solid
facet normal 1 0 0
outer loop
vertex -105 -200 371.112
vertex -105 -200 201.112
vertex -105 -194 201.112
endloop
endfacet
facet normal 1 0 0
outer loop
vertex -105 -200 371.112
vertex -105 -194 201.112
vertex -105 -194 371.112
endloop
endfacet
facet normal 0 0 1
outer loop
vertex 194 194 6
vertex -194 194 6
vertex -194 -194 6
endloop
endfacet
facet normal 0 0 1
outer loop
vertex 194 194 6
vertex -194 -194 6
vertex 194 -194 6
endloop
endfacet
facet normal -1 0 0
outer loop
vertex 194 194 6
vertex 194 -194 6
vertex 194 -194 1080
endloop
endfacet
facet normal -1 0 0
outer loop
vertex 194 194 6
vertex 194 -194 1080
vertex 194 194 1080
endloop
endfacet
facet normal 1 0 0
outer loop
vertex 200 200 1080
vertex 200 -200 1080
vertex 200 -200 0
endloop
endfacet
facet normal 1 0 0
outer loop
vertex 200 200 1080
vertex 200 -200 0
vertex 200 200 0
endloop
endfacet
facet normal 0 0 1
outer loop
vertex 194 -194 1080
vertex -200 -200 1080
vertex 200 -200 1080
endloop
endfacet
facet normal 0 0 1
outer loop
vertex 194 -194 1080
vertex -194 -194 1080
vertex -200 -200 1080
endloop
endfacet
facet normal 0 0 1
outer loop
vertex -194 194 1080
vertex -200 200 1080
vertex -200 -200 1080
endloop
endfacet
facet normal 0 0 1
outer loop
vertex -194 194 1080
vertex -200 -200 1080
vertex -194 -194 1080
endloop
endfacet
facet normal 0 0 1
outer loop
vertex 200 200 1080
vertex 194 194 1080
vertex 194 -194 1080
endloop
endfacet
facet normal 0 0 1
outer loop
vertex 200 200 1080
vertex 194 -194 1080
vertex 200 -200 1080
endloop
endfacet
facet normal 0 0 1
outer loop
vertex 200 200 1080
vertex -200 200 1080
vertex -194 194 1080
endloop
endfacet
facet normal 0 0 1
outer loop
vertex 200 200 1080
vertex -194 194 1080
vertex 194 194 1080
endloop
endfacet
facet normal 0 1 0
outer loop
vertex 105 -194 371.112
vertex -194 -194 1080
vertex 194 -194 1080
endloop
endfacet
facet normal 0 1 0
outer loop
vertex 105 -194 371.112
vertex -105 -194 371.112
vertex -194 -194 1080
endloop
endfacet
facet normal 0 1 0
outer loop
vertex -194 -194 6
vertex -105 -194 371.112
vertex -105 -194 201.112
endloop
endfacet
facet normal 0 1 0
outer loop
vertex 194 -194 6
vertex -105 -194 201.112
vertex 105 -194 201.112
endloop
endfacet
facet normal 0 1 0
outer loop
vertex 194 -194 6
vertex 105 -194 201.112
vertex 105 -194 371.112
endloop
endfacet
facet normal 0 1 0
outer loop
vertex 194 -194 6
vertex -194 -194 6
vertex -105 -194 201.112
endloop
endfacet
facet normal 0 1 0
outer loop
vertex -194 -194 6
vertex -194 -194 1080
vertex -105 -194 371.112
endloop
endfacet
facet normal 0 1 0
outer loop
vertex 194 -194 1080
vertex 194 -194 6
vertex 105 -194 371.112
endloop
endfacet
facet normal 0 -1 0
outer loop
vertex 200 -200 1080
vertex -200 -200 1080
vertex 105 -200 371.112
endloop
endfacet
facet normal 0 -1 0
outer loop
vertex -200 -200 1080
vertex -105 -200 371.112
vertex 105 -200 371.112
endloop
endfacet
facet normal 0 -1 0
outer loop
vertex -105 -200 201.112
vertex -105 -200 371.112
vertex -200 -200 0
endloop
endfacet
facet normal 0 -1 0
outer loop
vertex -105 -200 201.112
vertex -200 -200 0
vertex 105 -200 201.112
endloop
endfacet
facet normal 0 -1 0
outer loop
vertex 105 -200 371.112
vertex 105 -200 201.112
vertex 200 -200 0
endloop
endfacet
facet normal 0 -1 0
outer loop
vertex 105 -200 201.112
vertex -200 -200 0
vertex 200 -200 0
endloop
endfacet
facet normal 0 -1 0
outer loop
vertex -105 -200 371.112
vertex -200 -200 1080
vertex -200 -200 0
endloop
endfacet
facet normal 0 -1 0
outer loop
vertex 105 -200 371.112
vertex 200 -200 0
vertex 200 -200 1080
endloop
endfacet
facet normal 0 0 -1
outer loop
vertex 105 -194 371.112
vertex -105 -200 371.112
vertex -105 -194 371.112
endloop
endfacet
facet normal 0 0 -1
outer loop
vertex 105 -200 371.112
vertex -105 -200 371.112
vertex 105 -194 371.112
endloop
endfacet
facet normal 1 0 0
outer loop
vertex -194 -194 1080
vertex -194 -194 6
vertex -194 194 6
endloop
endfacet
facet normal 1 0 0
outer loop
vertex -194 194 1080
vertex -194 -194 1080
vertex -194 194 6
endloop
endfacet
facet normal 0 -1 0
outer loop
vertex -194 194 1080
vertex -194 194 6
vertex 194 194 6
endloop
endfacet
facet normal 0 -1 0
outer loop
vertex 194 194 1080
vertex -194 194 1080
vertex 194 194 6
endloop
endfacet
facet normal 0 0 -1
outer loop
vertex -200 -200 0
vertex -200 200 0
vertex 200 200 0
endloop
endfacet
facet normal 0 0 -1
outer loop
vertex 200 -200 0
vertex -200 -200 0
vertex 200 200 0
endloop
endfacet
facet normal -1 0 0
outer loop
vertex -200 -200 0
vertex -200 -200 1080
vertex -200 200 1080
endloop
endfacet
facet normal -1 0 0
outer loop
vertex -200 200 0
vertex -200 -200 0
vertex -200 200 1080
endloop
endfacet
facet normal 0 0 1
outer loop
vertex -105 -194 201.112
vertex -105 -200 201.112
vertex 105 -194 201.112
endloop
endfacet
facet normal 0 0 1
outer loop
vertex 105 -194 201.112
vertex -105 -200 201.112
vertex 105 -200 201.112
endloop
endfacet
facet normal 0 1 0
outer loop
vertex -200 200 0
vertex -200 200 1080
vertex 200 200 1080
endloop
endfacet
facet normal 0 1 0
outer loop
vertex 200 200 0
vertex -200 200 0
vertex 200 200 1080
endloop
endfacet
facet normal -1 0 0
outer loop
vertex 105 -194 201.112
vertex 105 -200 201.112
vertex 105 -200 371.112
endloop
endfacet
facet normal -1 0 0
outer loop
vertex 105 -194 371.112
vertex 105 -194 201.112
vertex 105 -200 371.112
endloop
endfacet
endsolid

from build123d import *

# Parameters (mm, degrees)
F0_W     = 388
F0_H     = 388
F1_DEPTH = 6
F0_W_2   = 400
F0_H_2   = 400
F2_DEPTH = 1080
F3_W     = 210
F3_H     = 170
F4_DEPTH = 25


with BuildPart() as f1:
    # F0 (on Top) → F1 (new body)
    with BuildSketch(Plane.XY):
        Rectangle(F0_W, F0_H)
    extrude(amount=F1_DEPTH)

    # F0 (on Top) → F2 (join)
    with BuildSketch(Plane.XY):
        Rectangle(F0_W_2, F0_H_2)
        Rectangle(F0_W, F0_H, mode=Mode.SUBTRACT)
    extrude(amount=F2_DEPTH)

    # F3 (on face) → F4 (cut)
    with BuildSketch(Plane.XZ.offset(200)):
        with Locations((0, 286.11201)):
            Rectangle(F3_W, F3_H)
    extrude(amount=-F4_DEPTH, mode=Mode.SUBTRACT)


solid = f1.part
